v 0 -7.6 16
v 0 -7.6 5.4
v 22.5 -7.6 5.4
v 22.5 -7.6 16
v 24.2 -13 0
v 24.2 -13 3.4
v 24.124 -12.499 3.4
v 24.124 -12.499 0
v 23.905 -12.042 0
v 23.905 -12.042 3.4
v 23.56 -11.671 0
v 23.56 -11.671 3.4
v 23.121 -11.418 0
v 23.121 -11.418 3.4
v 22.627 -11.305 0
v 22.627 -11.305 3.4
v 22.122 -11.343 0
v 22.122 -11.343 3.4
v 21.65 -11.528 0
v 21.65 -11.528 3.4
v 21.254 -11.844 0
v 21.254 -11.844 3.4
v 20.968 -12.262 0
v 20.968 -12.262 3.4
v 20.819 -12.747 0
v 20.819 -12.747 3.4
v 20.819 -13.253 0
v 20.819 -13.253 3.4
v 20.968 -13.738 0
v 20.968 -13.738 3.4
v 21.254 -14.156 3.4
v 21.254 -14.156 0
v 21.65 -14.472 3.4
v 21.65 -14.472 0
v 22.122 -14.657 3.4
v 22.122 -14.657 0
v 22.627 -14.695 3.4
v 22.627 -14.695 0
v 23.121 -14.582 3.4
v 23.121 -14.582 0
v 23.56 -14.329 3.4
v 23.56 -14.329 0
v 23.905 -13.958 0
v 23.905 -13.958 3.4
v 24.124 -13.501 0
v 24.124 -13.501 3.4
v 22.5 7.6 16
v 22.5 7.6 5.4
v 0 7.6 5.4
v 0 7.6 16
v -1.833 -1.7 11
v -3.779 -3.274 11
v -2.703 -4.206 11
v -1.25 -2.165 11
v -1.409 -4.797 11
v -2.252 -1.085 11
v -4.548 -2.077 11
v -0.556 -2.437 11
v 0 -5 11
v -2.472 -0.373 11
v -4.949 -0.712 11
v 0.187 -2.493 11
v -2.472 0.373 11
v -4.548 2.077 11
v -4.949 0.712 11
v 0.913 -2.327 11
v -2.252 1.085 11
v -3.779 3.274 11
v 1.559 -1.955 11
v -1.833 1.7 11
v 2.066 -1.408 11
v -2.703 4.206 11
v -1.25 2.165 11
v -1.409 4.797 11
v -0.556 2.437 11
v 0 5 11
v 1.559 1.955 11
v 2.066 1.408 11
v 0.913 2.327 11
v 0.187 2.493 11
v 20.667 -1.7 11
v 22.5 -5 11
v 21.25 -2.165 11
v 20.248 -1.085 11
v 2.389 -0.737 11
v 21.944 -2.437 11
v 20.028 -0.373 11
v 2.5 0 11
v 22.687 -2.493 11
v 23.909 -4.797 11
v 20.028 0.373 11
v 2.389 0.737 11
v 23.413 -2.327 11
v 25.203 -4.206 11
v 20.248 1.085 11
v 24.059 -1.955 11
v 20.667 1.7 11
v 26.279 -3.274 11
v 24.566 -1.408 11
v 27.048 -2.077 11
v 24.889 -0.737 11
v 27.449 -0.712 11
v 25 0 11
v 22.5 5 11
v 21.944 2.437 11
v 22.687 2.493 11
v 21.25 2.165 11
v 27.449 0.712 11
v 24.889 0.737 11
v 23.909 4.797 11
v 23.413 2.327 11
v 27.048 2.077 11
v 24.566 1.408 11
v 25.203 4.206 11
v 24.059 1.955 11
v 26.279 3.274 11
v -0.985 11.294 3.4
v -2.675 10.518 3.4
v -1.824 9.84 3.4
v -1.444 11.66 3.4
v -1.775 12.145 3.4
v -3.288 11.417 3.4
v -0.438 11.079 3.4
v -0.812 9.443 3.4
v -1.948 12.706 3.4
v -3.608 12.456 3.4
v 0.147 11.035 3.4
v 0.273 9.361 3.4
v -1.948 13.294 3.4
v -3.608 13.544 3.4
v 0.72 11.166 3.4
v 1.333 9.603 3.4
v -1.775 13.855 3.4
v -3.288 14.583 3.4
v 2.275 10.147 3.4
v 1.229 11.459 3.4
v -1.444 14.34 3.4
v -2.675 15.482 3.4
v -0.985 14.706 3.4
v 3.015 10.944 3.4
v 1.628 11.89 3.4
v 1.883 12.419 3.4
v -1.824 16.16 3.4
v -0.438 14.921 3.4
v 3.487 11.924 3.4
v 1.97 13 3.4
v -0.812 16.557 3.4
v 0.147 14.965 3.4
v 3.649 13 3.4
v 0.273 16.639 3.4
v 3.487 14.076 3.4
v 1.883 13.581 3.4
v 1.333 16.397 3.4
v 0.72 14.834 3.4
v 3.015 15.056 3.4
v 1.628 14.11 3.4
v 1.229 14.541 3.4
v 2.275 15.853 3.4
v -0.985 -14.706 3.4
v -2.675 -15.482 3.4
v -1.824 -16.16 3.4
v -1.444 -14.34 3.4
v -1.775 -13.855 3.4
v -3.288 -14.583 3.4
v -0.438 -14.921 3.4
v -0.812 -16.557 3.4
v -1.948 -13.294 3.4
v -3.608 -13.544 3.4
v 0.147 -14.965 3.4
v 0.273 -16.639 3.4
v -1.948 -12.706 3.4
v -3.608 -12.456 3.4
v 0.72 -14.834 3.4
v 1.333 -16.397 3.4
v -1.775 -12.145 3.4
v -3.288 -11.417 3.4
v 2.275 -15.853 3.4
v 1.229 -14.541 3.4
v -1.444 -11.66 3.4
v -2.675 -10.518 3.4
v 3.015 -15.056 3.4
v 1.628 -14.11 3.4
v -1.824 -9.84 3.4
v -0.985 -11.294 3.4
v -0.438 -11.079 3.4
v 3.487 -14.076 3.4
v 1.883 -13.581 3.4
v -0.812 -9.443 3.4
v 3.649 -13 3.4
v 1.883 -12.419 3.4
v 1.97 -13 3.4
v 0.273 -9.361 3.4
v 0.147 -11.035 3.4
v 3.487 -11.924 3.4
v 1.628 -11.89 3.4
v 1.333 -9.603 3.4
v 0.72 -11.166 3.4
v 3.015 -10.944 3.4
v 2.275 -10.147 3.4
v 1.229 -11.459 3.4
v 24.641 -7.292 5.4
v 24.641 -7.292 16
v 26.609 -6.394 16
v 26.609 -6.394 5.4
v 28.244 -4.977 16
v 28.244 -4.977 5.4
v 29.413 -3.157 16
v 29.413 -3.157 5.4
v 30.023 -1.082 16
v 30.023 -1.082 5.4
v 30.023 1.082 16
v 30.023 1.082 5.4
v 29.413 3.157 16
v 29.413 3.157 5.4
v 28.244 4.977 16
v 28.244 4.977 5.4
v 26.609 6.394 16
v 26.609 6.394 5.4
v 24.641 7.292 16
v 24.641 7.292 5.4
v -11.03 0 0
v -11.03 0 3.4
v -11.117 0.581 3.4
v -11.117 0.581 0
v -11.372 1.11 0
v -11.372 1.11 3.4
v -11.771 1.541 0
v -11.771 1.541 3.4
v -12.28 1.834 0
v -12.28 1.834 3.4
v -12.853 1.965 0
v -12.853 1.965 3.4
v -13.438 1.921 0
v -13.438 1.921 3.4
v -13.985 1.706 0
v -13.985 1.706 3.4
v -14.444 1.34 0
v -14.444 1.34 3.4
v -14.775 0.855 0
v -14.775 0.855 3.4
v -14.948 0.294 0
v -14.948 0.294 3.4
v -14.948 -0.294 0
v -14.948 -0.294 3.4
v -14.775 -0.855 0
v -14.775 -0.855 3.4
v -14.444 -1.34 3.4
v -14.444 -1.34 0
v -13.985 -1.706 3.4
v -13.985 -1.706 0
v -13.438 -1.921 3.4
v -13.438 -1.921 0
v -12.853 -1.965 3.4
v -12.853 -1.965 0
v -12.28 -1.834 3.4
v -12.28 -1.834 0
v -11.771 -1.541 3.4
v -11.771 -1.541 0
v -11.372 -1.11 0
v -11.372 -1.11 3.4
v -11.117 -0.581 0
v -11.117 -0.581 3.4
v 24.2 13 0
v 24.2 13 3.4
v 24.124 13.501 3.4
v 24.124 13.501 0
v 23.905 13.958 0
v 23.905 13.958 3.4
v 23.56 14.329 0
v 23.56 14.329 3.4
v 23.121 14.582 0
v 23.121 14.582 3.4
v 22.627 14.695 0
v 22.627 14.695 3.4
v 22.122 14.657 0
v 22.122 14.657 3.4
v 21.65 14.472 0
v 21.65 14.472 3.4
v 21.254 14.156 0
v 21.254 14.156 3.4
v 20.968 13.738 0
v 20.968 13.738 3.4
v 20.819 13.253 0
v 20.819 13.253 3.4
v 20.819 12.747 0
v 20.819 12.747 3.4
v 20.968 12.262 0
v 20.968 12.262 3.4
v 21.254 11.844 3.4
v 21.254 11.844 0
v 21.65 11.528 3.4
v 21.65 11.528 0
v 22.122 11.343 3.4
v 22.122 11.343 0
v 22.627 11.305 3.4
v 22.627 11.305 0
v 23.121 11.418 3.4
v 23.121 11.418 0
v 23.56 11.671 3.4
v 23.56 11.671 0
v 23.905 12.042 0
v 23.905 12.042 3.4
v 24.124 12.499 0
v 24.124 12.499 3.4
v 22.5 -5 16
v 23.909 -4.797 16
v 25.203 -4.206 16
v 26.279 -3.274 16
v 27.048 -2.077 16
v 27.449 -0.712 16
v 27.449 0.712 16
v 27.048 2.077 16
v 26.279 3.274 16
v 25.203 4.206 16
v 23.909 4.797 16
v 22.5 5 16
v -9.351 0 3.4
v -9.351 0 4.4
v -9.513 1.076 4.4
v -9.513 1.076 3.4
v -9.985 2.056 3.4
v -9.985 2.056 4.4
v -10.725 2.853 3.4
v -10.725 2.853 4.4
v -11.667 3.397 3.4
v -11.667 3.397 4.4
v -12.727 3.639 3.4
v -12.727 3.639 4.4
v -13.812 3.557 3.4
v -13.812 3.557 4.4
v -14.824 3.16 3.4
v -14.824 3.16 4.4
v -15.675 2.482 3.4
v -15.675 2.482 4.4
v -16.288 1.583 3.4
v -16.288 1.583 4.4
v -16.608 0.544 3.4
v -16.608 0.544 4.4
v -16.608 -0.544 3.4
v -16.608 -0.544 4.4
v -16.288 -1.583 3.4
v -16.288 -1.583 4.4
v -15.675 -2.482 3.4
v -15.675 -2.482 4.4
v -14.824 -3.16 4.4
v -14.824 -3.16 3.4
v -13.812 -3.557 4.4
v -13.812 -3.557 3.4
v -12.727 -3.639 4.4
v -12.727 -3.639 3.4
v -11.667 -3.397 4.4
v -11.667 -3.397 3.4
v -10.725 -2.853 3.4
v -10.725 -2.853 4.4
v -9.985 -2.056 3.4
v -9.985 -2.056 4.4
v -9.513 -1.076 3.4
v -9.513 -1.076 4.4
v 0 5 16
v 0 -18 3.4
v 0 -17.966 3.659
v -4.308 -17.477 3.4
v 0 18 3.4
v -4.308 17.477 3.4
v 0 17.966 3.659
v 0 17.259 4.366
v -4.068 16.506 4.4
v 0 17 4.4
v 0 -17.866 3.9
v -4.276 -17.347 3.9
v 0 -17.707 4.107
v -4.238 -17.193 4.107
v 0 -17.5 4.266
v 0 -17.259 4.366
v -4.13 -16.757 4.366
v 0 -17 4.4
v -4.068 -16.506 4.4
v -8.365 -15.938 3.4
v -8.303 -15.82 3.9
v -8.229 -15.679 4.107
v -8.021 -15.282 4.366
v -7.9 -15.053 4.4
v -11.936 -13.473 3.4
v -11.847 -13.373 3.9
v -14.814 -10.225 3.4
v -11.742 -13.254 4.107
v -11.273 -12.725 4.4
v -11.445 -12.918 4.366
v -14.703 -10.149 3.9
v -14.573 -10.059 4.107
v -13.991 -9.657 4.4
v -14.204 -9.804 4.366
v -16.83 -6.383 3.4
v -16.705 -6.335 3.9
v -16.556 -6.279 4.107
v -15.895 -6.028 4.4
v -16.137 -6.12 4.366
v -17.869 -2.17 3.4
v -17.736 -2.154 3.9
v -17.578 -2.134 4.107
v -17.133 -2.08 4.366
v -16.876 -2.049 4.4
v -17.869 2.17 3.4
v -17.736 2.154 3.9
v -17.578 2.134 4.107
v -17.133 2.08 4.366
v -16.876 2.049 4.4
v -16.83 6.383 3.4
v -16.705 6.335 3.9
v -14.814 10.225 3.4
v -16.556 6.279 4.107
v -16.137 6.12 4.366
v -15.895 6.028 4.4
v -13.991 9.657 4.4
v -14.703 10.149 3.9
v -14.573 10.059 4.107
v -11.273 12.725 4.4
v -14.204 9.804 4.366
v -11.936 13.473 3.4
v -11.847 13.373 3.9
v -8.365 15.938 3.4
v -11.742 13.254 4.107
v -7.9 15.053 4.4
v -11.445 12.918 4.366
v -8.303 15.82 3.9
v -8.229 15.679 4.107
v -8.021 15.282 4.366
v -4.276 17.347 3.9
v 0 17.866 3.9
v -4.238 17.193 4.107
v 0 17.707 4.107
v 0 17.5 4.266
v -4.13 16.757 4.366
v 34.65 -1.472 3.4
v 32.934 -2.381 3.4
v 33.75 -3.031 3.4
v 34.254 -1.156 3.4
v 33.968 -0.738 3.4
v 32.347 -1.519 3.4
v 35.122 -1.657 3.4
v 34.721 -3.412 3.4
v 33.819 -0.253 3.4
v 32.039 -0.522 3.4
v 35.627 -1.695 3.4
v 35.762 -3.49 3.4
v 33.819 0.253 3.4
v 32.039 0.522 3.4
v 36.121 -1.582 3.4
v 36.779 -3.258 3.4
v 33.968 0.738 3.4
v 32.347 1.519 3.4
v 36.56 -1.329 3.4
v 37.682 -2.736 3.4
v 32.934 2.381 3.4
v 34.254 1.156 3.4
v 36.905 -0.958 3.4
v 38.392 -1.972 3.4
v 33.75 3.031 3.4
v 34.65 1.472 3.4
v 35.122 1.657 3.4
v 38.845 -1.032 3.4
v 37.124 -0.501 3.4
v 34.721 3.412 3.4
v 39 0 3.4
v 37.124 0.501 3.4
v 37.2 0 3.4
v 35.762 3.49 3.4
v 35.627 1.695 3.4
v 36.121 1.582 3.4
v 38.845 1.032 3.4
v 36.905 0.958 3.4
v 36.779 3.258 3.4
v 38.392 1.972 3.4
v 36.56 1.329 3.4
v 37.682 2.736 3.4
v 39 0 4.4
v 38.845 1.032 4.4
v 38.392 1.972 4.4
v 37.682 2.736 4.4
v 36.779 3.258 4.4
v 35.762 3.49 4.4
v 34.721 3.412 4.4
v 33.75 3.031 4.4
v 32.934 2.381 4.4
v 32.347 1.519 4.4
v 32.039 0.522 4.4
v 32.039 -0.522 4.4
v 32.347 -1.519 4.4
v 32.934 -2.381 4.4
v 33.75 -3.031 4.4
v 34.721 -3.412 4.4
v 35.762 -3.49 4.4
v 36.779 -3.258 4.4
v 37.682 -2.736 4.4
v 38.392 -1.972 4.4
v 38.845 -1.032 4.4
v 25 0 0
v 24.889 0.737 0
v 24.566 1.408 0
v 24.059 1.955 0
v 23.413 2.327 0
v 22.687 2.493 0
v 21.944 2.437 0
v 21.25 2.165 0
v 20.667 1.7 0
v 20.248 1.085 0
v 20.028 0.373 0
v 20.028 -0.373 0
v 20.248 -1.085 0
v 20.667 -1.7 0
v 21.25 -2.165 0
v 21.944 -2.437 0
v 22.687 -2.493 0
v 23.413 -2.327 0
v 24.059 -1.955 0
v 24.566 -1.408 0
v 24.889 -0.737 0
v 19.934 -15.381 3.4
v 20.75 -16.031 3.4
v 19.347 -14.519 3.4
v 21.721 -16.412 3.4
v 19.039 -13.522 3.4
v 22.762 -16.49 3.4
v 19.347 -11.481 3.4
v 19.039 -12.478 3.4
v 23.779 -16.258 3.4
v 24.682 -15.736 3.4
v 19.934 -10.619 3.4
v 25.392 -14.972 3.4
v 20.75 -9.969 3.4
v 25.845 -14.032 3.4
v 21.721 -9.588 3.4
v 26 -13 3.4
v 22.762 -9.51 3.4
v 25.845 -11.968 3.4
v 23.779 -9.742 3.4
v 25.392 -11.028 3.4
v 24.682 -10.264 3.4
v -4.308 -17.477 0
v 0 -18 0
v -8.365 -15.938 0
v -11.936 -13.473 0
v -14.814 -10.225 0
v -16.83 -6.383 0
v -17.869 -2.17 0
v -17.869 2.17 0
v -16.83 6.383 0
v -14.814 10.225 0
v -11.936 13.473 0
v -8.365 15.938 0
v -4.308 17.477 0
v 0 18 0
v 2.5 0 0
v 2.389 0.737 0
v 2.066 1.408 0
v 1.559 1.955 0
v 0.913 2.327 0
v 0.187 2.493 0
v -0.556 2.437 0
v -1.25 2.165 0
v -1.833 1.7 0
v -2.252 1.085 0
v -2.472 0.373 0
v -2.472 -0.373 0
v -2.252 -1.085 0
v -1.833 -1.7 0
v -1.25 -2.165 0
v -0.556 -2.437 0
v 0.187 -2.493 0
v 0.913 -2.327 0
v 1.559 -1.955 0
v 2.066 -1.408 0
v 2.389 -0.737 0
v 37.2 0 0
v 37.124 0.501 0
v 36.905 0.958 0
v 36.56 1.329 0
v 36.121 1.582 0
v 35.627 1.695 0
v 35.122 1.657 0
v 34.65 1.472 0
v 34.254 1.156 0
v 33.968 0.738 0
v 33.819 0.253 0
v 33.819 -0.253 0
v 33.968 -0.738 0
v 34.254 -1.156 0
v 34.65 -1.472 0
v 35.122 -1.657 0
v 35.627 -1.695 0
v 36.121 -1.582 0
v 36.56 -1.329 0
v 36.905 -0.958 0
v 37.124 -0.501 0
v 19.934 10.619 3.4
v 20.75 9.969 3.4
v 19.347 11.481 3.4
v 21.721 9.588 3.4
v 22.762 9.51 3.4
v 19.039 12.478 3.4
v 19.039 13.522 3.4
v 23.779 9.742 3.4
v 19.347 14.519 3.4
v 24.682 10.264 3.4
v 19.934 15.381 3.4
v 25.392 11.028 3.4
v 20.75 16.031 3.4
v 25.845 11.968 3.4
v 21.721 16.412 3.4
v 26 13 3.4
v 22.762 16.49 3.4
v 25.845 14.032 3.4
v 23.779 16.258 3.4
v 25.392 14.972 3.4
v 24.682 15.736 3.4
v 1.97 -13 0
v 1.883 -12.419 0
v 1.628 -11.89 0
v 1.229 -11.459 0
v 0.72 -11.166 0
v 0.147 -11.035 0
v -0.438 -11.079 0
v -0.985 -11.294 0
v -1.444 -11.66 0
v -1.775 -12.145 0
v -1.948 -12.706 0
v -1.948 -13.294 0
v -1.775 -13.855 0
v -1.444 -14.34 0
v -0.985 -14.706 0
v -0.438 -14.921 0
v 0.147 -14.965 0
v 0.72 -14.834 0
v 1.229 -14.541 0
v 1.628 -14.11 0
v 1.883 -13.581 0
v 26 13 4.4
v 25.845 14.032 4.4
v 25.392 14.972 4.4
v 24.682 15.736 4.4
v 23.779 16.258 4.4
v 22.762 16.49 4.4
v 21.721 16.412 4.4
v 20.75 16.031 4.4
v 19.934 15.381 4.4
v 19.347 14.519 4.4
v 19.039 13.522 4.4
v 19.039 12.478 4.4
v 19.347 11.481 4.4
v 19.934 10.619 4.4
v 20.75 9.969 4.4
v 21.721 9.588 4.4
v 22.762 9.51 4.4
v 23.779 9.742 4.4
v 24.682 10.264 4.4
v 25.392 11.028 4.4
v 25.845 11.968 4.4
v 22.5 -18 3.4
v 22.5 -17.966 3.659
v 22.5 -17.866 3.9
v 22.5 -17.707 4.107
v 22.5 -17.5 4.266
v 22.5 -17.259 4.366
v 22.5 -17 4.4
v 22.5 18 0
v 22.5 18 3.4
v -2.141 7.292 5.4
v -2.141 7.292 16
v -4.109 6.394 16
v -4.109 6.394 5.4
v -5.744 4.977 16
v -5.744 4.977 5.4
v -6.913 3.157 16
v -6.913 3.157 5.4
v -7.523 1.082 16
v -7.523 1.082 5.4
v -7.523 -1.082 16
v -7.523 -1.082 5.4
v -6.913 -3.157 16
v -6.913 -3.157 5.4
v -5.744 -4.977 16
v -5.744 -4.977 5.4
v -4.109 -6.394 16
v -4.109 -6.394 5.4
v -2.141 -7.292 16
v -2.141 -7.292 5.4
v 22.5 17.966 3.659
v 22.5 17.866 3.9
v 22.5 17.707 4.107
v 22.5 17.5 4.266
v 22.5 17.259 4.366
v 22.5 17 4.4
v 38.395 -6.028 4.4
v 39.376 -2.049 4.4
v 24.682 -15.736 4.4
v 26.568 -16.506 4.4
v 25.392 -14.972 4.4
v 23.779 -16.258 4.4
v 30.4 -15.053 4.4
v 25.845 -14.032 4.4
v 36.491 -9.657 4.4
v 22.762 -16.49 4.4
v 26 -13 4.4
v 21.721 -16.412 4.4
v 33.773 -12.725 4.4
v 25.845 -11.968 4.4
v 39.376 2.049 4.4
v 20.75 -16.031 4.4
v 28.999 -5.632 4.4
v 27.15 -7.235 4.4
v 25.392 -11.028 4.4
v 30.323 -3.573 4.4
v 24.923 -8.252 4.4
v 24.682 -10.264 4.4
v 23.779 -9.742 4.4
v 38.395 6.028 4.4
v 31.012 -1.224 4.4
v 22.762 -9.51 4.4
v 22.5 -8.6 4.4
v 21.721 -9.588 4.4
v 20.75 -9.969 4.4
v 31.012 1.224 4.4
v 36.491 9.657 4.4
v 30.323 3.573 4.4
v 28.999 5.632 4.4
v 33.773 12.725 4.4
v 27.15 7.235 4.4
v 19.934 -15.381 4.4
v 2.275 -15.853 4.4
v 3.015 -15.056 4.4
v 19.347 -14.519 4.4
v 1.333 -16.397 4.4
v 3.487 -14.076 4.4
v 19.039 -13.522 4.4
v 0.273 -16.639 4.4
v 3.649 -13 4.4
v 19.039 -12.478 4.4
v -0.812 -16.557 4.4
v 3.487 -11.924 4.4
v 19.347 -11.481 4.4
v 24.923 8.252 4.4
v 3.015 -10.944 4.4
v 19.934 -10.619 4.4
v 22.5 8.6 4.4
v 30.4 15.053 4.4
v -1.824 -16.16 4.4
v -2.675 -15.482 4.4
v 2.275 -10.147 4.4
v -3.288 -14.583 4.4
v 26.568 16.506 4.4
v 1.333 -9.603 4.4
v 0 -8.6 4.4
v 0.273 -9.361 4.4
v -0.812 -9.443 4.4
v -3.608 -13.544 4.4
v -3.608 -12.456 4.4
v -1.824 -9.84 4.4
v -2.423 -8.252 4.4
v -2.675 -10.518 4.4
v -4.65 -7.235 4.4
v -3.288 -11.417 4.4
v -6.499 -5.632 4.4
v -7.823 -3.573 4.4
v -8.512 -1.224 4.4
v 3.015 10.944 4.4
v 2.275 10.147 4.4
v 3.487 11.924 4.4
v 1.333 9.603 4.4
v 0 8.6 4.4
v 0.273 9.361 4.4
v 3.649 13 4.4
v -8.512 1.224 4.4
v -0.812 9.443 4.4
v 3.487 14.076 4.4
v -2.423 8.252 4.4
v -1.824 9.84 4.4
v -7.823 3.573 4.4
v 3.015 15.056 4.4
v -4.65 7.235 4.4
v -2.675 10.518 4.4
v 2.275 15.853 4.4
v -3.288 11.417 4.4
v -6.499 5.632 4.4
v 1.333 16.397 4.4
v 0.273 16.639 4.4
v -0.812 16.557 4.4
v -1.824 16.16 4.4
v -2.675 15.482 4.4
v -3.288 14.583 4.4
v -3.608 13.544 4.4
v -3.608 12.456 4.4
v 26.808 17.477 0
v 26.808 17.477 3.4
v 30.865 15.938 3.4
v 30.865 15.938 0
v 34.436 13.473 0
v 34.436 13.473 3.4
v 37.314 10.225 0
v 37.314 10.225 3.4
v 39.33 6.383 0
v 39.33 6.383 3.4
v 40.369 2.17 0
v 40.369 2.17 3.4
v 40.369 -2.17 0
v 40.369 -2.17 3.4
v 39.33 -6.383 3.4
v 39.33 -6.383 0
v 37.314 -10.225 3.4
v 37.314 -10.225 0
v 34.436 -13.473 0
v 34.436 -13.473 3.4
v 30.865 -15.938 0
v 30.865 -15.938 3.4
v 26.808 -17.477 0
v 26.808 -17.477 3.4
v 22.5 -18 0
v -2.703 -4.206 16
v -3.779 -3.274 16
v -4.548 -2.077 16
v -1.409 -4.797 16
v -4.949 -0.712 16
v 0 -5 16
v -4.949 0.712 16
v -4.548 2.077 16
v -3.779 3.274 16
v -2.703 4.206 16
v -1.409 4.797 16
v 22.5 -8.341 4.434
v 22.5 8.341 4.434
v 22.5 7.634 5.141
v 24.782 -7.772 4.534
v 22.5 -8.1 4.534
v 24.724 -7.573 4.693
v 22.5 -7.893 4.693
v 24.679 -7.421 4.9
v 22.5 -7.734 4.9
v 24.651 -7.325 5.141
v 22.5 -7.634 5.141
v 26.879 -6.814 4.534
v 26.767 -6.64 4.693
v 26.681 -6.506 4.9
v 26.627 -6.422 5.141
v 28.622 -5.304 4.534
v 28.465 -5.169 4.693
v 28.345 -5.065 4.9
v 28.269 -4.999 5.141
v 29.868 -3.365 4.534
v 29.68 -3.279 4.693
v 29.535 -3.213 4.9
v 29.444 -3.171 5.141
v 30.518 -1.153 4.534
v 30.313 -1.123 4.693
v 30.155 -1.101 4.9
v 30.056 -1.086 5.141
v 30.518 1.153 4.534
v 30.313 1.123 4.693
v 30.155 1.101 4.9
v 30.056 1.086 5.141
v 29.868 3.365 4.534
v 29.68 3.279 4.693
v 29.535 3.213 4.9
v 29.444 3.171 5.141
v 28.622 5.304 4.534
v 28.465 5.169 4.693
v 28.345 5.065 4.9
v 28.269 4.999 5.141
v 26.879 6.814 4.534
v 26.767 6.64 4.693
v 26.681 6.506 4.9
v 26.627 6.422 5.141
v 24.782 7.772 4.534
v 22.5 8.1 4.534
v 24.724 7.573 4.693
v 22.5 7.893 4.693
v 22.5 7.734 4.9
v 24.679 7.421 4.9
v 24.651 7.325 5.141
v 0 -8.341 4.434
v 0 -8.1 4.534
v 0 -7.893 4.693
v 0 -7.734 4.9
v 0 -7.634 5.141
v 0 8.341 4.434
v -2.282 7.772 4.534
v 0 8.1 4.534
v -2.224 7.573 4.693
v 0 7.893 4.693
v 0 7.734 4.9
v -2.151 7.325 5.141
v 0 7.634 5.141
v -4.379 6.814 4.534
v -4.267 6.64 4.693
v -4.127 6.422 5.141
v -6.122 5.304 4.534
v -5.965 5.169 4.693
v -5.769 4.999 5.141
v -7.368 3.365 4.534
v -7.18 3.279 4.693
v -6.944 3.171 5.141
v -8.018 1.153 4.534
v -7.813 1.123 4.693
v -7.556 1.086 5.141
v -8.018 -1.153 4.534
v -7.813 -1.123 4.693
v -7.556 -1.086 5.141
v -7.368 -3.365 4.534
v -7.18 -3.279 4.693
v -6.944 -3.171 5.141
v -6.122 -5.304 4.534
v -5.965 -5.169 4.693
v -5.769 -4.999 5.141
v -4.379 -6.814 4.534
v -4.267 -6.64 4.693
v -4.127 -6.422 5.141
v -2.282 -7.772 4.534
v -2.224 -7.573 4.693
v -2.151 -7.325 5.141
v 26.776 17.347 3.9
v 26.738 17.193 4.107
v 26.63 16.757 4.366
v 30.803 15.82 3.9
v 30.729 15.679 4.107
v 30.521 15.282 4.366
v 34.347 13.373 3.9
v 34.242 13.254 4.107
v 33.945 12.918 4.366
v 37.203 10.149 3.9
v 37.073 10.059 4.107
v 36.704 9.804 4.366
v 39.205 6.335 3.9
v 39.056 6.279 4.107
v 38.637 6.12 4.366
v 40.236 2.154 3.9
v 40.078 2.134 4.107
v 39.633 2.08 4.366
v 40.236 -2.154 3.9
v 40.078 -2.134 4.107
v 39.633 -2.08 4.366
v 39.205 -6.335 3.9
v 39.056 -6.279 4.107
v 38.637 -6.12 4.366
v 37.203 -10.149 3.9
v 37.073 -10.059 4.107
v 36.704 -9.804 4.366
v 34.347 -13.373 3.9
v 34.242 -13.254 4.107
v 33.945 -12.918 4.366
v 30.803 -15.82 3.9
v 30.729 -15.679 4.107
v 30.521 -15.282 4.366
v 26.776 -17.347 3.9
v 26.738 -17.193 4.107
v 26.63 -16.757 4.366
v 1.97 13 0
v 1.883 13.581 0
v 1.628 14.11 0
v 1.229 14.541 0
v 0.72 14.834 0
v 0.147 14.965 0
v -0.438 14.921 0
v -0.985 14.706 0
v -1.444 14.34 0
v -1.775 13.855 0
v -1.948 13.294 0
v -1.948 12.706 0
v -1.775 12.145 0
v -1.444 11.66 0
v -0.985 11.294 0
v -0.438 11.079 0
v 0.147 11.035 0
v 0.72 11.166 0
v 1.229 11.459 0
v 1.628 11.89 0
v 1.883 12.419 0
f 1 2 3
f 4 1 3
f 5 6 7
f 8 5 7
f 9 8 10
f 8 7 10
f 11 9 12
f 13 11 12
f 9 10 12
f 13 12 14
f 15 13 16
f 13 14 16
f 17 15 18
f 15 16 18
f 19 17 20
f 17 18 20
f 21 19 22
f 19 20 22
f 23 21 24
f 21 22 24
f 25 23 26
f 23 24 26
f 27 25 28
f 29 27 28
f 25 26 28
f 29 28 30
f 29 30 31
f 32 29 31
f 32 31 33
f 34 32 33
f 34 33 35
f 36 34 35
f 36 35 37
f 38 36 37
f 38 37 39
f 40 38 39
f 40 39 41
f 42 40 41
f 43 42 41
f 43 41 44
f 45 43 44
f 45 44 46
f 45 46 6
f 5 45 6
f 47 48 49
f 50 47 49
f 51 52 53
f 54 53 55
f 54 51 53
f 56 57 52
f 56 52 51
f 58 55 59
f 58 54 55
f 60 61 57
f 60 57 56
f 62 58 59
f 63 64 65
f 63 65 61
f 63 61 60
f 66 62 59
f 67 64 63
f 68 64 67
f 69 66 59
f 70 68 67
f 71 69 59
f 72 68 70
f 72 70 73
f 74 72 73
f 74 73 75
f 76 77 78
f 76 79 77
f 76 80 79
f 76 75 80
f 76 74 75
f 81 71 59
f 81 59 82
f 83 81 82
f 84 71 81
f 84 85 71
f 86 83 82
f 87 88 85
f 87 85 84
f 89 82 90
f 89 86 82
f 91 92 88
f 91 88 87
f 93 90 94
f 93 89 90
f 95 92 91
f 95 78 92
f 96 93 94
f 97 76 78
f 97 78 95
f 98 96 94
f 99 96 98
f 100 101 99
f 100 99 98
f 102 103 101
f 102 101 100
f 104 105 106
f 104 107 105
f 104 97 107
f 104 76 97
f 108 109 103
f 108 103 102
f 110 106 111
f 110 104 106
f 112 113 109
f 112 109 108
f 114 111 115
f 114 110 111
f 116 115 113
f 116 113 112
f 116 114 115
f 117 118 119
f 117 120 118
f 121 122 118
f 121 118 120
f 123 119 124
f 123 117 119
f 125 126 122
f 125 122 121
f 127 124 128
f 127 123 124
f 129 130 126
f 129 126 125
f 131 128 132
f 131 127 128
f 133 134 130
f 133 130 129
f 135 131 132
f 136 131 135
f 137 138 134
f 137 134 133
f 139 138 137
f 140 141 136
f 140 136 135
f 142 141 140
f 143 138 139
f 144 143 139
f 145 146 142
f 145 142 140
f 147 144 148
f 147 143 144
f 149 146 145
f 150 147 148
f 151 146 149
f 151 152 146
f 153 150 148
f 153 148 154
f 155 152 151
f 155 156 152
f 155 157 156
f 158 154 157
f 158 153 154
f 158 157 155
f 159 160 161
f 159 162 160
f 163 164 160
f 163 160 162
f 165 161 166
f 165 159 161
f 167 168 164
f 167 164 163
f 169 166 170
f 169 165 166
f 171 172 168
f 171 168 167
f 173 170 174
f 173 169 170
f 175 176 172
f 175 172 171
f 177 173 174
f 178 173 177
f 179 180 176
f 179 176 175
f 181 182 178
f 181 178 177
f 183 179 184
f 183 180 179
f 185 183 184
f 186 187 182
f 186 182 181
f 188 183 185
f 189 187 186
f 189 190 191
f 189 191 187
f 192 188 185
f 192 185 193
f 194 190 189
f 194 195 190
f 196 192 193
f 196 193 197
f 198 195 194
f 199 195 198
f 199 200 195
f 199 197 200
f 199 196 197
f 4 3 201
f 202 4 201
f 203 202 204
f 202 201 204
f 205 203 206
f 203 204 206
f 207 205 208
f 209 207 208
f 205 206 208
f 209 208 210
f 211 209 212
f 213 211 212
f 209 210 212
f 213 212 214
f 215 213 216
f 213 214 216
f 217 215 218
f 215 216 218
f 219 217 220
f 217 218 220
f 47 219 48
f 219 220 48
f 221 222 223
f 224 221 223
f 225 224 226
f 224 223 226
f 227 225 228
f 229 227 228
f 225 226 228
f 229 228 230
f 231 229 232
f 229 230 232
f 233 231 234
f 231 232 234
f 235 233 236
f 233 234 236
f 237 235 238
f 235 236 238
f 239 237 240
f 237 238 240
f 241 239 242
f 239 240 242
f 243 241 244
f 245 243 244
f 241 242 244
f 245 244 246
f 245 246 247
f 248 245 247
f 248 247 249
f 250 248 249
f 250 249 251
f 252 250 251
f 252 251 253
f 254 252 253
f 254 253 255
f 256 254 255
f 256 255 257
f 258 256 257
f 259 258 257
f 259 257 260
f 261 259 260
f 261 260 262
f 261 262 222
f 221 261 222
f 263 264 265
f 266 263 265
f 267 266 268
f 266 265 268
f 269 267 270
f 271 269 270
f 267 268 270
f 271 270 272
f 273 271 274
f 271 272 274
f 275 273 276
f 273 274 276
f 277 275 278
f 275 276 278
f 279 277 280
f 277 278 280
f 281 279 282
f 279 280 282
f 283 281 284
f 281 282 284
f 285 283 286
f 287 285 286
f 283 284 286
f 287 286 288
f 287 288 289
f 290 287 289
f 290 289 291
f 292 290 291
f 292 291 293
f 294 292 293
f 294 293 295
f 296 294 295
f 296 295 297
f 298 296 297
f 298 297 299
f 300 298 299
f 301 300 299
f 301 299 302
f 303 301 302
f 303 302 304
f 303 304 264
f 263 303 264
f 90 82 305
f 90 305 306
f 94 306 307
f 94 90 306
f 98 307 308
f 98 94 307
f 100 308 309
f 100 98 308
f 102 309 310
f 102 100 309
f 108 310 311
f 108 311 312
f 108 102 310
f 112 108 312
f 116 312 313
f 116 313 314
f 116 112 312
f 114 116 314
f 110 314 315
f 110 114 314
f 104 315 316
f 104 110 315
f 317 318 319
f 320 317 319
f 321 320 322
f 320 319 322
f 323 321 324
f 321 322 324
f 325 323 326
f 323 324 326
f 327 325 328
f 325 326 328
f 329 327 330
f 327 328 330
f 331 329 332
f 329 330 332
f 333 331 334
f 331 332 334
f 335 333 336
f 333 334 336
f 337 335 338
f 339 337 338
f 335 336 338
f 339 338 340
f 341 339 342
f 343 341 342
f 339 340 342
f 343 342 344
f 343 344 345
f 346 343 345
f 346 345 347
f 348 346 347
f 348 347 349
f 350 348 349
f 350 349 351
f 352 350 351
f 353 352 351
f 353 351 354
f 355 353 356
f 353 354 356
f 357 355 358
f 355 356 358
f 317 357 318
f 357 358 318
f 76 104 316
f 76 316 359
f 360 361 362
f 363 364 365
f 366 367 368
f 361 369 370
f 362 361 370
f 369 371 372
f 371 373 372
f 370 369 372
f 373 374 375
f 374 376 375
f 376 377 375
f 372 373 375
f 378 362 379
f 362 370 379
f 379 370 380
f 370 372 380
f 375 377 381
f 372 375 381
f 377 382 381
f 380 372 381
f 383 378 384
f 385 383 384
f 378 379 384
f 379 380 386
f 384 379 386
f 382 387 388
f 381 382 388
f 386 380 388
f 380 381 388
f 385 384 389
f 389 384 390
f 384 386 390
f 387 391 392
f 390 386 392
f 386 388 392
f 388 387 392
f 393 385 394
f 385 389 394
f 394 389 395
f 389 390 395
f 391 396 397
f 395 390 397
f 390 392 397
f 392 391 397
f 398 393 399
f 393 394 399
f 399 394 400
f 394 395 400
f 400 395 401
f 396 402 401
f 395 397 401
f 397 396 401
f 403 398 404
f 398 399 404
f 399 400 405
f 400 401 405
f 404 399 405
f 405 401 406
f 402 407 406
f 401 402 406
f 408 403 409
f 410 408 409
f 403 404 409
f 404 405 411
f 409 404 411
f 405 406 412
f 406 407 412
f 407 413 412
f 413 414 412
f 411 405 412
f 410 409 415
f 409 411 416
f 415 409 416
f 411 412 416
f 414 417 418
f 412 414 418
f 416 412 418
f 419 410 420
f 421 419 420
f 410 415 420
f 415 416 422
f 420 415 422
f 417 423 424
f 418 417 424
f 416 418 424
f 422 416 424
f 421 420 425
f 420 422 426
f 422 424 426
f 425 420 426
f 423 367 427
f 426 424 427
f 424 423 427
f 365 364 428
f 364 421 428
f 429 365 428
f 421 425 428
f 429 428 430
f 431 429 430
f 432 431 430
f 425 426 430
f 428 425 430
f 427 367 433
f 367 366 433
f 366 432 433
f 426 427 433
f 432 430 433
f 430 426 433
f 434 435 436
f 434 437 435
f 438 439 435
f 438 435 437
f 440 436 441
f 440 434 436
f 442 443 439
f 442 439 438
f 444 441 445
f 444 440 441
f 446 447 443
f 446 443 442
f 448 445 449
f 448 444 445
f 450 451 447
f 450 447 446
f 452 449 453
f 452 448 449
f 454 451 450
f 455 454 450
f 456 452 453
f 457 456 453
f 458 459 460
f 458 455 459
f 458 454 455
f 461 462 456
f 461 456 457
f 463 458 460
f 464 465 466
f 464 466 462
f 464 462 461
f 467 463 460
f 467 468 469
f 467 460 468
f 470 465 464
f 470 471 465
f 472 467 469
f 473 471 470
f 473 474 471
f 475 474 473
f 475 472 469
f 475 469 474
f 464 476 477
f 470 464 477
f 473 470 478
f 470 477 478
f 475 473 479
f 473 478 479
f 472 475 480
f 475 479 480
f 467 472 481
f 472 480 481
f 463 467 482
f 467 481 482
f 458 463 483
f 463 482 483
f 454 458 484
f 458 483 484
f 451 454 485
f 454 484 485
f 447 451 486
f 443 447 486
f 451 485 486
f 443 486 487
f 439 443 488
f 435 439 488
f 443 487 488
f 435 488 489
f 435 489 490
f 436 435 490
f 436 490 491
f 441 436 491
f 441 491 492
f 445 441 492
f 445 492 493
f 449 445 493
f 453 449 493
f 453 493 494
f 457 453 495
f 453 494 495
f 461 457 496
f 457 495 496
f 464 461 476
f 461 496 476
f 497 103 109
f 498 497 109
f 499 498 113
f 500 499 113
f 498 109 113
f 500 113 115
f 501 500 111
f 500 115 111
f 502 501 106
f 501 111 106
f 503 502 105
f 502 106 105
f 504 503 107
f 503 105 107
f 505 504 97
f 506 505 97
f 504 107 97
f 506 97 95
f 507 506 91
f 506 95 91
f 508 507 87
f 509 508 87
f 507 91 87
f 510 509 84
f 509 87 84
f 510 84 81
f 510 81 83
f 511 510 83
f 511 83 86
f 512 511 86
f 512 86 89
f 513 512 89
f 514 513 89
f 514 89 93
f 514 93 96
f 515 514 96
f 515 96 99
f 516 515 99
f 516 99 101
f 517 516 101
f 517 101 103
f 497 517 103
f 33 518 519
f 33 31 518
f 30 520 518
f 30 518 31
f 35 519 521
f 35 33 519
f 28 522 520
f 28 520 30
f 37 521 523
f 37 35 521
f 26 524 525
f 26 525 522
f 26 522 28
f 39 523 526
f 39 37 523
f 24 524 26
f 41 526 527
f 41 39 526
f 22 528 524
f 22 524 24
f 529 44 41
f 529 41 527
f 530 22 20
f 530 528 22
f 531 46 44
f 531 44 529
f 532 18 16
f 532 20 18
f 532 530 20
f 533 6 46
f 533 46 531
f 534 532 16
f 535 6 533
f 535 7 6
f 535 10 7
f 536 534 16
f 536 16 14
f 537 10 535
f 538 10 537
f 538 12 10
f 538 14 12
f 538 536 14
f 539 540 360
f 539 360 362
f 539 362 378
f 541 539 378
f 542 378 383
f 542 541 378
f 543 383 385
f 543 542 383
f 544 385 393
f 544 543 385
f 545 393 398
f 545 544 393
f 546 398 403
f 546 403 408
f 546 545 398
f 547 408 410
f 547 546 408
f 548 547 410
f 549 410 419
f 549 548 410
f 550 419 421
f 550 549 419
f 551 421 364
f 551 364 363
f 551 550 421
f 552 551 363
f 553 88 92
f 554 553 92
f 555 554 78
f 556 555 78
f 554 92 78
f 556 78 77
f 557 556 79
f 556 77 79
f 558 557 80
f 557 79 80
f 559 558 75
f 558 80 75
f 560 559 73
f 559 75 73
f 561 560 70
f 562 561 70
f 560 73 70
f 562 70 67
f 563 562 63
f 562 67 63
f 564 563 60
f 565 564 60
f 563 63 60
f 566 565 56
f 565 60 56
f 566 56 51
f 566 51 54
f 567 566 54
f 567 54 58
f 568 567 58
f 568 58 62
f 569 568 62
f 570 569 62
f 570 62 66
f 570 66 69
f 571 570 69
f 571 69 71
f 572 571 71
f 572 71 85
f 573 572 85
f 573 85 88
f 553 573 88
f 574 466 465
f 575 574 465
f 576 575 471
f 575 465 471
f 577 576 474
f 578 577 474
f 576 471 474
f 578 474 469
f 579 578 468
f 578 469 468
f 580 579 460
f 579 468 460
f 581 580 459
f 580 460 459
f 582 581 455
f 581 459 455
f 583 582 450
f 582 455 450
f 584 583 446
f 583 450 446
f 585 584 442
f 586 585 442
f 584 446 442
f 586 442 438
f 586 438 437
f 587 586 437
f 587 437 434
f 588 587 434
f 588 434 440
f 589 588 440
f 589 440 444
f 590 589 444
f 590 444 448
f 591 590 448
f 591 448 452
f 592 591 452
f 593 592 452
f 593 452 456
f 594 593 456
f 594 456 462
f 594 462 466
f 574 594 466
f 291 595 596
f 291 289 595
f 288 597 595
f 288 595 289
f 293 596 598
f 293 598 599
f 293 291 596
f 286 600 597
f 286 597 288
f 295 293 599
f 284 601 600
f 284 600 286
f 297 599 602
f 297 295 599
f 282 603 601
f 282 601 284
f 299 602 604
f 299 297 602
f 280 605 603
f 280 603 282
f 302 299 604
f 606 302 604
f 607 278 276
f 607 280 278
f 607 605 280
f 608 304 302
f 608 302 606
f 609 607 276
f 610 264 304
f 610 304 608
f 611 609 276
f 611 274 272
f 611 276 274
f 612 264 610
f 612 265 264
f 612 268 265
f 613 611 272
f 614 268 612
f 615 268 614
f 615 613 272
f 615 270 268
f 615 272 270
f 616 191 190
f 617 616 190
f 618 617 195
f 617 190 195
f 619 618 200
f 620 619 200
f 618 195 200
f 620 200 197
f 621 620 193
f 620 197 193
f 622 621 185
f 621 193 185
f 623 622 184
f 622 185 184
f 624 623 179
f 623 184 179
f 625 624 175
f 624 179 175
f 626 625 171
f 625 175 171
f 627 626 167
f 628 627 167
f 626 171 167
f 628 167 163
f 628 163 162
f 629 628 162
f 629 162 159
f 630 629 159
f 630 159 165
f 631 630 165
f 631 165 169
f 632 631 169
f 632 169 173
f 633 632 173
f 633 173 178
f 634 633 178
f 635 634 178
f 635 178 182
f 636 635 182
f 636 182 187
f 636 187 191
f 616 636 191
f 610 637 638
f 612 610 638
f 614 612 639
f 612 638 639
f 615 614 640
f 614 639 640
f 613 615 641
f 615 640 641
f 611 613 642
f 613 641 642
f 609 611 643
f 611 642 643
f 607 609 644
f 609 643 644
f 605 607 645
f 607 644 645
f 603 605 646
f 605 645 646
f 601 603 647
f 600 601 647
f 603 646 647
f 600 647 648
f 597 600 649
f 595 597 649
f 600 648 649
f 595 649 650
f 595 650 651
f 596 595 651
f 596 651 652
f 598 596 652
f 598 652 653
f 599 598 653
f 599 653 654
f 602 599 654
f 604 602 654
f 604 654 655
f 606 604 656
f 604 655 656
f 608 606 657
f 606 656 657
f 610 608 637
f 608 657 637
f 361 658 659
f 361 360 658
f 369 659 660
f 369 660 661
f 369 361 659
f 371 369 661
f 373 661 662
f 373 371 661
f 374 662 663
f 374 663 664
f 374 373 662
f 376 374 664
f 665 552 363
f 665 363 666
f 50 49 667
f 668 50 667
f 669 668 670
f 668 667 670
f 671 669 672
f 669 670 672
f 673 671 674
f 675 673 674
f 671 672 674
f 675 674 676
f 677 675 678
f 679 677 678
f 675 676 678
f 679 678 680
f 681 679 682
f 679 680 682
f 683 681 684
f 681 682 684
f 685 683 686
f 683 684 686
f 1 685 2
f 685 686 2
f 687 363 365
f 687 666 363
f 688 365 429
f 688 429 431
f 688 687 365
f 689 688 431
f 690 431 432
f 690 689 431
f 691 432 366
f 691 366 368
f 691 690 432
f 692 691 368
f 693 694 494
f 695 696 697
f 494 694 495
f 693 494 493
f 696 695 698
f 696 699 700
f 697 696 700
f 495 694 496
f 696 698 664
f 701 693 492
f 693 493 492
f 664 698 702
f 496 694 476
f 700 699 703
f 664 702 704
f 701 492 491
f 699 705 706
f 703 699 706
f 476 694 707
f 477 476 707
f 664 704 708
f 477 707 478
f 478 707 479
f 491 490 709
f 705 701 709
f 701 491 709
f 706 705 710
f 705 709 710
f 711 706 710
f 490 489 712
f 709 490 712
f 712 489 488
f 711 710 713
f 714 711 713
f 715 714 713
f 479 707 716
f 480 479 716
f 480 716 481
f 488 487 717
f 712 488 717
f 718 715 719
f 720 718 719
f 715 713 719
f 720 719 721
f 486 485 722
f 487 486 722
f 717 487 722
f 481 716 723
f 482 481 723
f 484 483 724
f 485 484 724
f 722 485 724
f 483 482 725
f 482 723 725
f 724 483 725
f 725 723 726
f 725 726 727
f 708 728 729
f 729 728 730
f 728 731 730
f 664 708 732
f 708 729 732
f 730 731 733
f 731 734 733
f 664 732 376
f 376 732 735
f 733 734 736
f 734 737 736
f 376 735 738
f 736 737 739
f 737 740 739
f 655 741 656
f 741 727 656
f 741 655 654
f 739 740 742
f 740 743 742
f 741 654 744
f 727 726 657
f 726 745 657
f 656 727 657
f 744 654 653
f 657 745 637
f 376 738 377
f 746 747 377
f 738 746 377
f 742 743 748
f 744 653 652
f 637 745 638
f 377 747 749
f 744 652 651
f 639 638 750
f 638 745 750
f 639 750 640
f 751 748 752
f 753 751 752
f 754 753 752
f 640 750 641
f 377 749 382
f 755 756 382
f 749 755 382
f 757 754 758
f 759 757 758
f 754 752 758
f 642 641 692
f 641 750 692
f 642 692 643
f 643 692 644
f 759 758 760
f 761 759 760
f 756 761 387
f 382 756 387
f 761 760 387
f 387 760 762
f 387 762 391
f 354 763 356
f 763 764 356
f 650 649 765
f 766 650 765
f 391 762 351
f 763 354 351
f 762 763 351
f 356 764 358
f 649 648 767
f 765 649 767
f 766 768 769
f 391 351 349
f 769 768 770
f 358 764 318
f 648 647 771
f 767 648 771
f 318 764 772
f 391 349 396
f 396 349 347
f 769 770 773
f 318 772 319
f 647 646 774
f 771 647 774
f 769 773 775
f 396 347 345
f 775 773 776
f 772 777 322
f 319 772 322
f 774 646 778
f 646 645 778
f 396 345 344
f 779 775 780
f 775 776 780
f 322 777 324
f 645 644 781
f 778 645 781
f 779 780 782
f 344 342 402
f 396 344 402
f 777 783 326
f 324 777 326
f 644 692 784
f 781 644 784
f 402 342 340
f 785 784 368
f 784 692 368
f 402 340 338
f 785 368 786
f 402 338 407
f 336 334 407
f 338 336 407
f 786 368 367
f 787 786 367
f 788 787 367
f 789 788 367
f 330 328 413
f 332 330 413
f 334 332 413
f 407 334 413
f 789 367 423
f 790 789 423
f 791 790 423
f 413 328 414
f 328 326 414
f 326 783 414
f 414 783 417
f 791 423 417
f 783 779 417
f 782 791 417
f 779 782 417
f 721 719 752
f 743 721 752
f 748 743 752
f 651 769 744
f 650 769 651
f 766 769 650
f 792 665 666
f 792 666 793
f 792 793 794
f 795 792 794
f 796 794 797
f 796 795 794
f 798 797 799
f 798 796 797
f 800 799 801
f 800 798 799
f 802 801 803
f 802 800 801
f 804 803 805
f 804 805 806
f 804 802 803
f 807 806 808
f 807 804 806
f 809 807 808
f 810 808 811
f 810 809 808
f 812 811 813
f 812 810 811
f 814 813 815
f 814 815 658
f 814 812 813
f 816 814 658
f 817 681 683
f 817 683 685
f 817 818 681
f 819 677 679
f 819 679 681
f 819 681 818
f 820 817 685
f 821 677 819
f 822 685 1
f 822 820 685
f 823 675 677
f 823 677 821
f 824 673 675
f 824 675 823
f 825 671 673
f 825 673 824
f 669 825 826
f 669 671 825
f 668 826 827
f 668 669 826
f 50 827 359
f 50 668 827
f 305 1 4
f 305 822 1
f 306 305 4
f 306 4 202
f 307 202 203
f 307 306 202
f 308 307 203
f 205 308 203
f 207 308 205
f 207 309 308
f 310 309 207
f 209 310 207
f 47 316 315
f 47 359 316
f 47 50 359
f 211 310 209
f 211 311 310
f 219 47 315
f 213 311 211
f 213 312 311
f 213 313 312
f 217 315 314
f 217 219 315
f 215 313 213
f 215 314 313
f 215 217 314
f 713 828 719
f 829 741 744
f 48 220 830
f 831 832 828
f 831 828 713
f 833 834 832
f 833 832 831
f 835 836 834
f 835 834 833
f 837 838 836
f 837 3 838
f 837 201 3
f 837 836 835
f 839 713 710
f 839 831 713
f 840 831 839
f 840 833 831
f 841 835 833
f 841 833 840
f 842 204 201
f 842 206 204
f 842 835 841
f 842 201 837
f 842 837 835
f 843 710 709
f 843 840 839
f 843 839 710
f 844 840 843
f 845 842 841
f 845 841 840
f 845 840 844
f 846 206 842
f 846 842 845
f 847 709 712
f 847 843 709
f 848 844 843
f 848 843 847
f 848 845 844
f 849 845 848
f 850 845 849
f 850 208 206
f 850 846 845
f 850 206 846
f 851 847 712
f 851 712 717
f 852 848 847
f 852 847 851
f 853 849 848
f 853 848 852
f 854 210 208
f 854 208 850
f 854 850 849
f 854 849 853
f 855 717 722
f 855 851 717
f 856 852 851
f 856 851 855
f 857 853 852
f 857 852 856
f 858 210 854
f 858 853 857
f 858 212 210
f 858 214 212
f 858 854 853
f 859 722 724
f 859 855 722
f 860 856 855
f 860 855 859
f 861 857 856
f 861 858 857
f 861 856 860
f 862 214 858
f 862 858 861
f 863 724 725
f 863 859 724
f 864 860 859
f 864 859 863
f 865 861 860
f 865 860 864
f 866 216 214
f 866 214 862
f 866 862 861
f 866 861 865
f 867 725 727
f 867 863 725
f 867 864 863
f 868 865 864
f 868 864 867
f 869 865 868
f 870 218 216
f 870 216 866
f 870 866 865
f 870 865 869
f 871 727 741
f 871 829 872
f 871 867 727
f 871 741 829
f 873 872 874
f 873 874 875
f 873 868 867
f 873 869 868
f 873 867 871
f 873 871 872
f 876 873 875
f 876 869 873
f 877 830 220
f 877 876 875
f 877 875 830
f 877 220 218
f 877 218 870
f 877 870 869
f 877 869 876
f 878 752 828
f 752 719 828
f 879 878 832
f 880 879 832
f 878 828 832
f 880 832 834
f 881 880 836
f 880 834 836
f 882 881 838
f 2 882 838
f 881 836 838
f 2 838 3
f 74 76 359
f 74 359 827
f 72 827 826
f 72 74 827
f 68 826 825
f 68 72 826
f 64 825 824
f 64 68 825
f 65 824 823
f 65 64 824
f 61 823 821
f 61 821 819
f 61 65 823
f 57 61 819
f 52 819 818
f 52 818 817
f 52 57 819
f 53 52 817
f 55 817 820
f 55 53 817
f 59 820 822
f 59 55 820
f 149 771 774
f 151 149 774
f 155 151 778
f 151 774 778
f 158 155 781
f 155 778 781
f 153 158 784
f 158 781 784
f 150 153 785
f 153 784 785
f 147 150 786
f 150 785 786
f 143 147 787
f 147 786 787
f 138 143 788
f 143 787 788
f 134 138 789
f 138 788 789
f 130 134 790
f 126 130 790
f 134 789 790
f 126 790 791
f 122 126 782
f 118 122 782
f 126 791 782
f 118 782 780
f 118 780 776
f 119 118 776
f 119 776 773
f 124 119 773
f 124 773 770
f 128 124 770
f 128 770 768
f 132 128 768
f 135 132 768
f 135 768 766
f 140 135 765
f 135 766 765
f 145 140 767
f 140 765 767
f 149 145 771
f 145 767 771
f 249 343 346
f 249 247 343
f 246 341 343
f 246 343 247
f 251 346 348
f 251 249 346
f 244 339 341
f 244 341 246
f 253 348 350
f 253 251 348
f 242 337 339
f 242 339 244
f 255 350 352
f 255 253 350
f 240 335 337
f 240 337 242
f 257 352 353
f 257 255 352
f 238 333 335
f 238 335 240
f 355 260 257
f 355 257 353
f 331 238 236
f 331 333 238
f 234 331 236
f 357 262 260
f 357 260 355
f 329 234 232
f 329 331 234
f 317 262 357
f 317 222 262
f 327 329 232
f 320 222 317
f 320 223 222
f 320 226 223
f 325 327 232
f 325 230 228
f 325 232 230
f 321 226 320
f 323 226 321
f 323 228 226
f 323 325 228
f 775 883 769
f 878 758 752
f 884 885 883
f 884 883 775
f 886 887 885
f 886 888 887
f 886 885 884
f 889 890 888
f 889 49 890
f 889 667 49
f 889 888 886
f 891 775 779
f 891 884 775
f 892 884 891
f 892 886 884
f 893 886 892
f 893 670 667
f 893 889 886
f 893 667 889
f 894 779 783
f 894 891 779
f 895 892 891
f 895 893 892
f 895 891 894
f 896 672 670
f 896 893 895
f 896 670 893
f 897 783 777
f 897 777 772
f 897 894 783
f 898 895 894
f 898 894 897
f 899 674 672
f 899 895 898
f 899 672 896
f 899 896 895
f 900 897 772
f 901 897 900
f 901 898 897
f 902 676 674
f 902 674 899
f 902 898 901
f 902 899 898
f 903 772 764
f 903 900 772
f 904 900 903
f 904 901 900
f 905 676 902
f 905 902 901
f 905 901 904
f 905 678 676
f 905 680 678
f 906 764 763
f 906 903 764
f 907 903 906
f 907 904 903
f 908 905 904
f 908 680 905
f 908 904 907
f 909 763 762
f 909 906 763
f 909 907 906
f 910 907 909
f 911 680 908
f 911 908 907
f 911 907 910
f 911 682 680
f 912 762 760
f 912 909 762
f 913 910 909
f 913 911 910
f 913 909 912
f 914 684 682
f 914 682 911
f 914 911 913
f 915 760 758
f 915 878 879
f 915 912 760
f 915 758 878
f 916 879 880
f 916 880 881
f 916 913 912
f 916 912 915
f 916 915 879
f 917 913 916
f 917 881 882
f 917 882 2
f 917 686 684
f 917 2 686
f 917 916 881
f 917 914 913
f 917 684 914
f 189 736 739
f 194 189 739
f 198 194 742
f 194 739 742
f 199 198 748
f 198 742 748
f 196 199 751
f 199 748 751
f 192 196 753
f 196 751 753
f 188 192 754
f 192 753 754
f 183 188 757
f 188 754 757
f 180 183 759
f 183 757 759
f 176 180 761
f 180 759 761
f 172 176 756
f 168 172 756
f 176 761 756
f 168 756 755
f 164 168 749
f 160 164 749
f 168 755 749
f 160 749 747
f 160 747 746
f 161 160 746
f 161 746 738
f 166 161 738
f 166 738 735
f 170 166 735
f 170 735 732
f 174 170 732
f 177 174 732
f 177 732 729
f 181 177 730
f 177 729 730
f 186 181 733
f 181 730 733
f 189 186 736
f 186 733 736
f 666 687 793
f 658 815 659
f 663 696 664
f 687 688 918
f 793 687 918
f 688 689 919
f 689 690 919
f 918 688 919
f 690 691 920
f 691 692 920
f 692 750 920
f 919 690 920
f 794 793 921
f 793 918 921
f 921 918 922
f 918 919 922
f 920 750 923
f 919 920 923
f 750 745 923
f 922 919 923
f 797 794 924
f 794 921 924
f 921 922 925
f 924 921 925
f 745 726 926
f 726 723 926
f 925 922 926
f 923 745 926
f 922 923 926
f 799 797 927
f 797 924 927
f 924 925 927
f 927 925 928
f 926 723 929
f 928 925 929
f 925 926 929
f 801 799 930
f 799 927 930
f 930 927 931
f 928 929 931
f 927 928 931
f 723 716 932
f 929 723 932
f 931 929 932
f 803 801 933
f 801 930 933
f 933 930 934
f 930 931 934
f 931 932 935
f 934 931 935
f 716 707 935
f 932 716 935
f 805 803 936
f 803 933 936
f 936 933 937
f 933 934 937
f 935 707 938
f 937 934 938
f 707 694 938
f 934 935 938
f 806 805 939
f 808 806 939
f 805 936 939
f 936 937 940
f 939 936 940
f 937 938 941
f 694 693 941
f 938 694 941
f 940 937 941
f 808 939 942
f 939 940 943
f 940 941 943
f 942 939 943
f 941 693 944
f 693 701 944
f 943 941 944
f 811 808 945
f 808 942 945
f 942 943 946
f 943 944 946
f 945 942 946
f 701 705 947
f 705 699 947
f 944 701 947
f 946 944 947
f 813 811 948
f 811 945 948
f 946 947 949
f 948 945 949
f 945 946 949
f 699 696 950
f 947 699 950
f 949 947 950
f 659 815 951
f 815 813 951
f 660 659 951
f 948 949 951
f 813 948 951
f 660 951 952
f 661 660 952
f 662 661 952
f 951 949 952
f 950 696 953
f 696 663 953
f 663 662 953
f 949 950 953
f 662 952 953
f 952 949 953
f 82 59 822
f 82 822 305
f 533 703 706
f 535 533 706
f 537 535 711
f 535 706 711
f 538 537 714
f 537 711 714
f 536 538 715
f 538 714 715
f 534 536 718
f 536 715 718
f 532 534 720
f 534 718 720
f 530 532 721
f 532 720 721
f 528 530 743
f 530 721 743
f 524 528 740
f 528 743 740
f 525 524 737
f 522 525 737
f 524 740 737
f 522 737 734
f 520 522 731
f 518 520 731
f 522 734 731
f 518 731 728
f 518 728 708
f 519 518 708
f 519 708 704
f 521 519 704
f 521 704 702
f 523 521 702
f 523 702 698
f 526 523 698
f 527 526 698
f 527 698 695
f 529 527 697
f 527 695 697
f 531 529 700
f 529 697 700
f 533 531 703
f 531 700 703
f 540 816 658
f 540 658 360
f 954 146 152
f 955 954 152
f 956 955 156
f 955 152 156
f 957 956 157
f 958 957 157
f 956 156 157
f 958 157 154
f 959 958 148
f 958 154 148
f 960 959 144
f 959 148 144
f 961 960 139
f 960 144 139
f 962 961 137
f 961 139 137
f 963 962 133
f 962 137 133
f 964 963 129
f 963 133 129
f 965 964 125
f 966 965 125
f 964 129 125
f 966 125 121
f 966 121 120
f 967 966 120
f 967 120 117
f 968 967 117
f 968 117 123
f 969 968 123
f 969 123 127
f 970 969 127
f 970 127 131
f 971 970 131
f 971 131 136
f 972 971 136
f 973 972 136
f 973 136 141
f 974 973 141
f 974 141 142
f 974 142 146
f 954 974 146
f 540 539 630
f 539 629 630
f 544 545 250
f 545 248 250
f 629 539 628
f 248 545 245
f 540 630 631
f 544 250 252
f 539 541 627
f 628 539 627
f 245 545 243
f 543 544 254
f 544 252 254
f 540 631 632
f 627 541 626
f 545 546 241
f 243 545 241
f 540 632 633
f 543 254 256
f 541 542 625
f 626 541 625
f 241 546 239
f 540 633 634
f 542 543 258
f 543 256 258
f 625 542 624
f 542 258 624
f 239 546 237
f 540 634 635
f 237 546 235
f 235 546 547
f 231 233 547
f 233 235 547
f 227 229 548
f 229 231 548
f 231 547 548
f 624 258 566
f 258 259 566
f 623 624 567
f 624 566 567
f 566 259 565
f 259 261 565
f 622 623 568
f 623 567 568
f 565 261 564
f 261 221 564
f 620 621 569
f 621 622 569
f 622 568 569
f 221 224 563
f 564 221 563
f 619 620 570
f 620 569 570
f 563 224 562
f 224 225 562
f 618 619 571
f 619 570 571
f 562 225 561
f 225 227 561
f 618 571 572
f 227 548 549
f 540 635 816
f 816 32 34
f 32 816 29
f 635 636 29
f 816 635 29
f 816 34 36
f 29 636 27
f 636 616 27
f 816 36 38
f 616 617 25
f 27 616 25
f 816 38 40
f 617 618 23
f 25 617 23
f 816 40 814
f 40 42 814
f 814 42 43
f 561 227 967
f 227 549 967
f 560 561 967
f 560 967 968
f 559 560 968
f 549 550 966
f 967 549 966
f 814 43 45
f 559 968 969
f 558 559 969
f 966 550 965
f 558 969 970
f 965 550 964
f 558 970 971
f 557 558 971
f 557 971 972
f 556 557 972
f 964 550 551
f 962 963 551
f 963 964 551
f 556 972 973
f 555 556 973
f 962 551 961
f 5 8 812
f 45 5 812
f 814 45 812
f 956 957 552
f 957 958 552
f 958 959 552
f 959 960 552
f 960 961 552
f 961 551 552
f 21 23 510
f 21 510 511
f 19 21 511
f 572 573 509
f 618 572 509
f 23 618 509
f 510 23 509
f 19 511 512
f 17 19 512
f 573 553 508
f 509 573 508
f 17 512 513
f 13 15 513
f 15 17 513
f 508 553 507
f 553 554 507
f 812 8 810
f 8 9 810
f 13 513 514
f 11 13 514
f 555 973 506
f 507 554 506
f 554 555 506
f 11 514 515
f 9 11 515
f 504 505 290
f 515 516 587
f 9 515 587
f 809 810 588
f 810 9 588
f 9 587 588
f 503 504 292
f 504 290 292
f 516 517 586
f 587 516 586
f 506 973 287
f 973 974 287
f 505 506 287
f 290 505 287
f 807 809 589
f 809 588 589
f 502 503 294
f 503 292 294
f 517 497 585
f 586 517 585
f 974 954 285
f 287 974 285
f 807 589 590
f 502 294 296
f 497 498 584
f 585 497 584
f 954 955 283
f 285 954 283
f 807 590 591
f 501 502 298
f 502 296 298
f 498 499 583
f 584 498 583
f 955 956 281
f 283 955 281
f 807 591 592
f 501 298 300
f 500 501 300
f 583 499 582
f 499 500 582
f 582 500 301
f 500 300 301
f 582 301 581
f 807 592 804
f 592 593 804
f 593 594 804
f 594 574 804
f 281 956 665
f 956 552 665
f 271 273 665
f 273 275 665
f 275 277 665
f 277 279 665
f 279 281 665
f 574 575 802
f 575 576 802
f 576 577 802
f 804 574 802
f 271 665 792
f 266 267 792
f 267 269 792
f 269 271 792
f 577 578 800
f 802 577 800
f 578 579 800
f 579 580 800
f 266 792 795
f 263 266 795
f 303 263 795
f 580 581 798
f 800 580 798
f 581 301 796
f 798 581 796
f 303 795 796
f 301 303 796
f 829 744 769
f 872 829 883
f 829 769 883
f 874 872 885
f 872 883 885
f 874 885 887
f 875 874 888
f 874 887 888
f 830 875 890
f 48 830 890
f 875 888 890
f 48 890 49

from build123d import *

# Parameters (mm, degrees)
BOSS_EXTRUDE1_DEPTH = 4.4
BOSS_EXTRUDE2_DEPTH = 16
BOSS_EXTRUDE3_DEPTH = 11
SKETCH2_R           = 2.5
CUT_EXTRUDE1_DEPTH  = 46.664537663
SKETCH3_R           = 3.5
SKETCH3_R_2         = 1.7
SKETCH3_R_3         = 3.648925592
SKETCH3_R_4         = 1.97040034
CUT_EXTRUDE2_DEPTH  = 1
SKETCH3_3_R         = 1.7
SKETCH3_3_R_2       = 1.97040034
CUT_EXTRUDE3_DEPTH  = 46.812771145
FILLET1_R           = 1


with BuildPart() as part:
    # Sketch1 → Boss-Extrude1 (new body)
    with BuildSketch(Plane.XY):
        with BuildLine():
            ThreePointArc((0, 18), (-18, 0), (0, -18))
            Line((0, -18), (22.5, -18))
            ThreePointArc((22.5, -18), (40.5, 0), (22.5, 18))
            Line((22.5, 18), (0, 18))
        make_face()
        with BuildLine():
            Line((22.5, -7.6), (0, -7.6))
            ThreePointArc((0, -7.6), (-7.6, 0), (0, 7.6))
            Line((0, 7.6), (22.5, 7.6))
            ThreePointArc((22.5, 7.6), (30.1, 0), (22.5, -7.6))
        make_face(mode=Mode.SUBTRACT)
    extrude(amount=BOSS_EXTRUDE1_DEPTH)

    # Sketch1<3> → Boss-Extrude2 (add)
    with BuildSketch(Plane.XY):
        with BuildLine():
            ThreePointArc((0, 7.6), (-7.6, 0), (0, -7.6))
            Line((0, -7.6), (22.5, -7.6))
            ThreePointArc((22.5, -7.6), (30.1, 0), (22.5, 7.6))
            Line((22.5, 7.6), (0, 7.6))
        make_face()
        with BuildLine():
            Line((22.5, -5), (0, -5))
            ThreePointArc((0, -5), (-5, 0), (0, 5))
            Line((0, 5), (22.5, 5))
            ThreePointArc((22.5, 5), (27.5, 0), (22.5, -5))
        make_face(mode=Mode.SUBTRACT)
    extrude(amount=BOSS_EXTRUDE2_DEPTH)

    # Sketch1<4> → Boss-Extrude3 (add)
    with BuildSketch(Plane.XY):
        with BuildLine():
            ThreePointArc((0, 5), (-5, 0), (0, -5))
            Line((0, -5), (22.5, -5))
            ThreePointArc((22.5, -5), (27.5, 0), (22.5, 5))
            Line((22.5, 5), (0, 5))
        make_face()
    extrude(amount=BOSS_EXTRUDE3_DEPTH)

    # Sketch2 → Cut-Extrude1 (cut, through all)
    with BuildSketch(Plane.XY.offset(11)):
        Circle(SKETCH2_R)
        with Locations((22.5, 0)):
            Circle(SKETCH2_R)
    extrude(amount=-CUT_EXTRUDE1_DEPTH, mode=Mode.SUBTRACT)

    # Sketch3 → Cut-Extrude2 (cut)
    # profile 1 of 6: a face of its own
    with BuildSketch(Plane.XY.offset(4.4)):
        with Locations((35.5, 0)):
            Circle(SKETCH3_R)
        with Locations((35.5, 0)):
            Circle(SKETCH3_R_2, mode=Mode.SUBTRACT)
    # profile 2 of 6: a face of its own
    with BuildSketch(Plane.XY.offset(4.4)):
        with Locations((-13, 0)):
            Circle(SKETCH3_R_3)
        with Locations((-13, 0)):
            Circle(SKETCH3_R_4, mode=Mode.SUBTRACT)
    # profile 3 of 6: a face of its own
    with BuildSketch(Plane.XY.offset(4.4)):
        with Locations((22.5, -13)):
            Circle(SKETCH3_R)
        with Locations((22.5, -13)):
            Circle(SKETCH3_R_2, mode=Mode.SUBTRACT)
    # profile 4 of 6: a face of its own
    with BuildSketch(Plane.XY.offset(4.4)):
        with Locations((0, 13)):
            Circle(SKETCH3_R_3)
        with Locations((0, 13)):
            Circle(SKETCH3_R_4, mode=Mode.SUBTRACT)
    # profile 5 of 6: a face of its own
    with BuildSketch(Plane.XY.offset(4.4)):
        with Locations((0, -13)):
            Circle(SKETCH3_R_3)
        with Locations((0, -13)):
            Circle(SKETCH3_R_4, mode=Mode.SUBTRACT)
    # profile 6 of 6: a face of its own
    with BuildSketch(Plane.XY.offset(4.4)):
        with Locations((22.5, 13)):
            Circle(SKETCH3_R)
        with Locations((22.5, 13)):
            Circle(SKETCH3_R_2, mode=Mode.SUBTRACT)
    extrude(amount=-CUT_EXTRUDE2_DEPTH, mode=Mode.SUBTRACT)

    # Sketch3<3> → Cut-Extrude3 (cut, through all)
    with BuildSketch(Plane.XY.offset(4.4)):
        with Locations((35.5, 0)):
            Circle(SKETCH3_3_R)
        with Locations((-13, 0)):
            Circle(SKETCH3_3_R_2)
        with Locations((22.5, -13)):
            Circle(SKETCH3_3_R)
        with Locations((0, 13)):
            Circle(SKETCH3_3_R_2)
        with Locations((0, -13)):
            Circle(SKETCH3_3_R_2)
        with Locations((22.5, 13)):
            Circle(SKETCH3_3_R)
    extrude(amount=-CUT_EXTRUDE3_DEPTH, mode=Mode.SUBTRACT)

    # Fillet1
    fillet1_edges = [part.edges().sort_by_distance(p)[0] for p in [
        (11.25, -18, 4.4),
        (-18, 0, 4.4),
        (11.25, 18, 4.4),
        (-7.6, 0, 4.4),
        (11.25, 7.6, 4.4),
        (30.1, 0, 4.4),
        (40.5, 0, 4.4),
        (11.25, -7.6, 4.4),
    ]]
    fillet(fillet1_edges, radius=FILLET1_R)


solid = part.part
